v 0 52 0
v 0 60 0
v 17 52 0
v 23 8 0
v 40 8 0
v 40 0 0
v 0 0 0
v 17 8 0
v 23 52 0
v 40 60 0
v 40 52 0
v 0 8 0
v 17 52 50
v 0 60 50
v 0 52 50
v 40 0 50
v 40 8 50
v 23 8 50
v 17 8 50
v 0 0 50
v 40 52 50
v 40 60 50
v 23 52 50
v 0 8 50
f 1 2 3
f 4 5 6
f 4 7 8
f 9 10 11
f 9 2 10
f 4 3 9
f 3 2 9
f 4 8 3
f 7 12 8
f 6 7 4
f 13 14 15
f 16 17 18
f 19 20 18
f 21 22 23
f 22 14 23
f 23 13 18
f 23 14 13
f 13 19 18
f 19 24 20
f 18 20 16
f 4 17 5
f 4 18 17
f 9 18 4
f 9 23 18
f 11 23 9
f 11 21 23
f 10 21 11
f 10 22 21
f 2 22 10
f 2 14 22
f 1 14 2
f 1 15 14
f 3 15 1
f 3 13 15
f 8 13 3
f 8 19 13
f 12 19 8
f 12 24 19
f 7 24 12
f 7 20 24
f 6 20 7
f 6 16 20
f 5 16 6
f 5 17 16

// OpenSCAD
$fn = 32;

// ----------------------------------------------------------------------
// Structural section: ibeam 40 x 60 mm
// ----------------------------------------------------------------------

// --- parameters (mm) ---
sec_w = 40;               // section width, X
sec_h = 60;               // section height, Y
flange_t = 8;             // flange thickness
web_t = 6;                // web thickness
plate_t = 50;             // cut length, Z (extrusion height)

profile = [[0, 0], [40, 0], [40, 8], [23, 8], [23, 52], [40, 52], [40, 60], [0, 60], [0, 52], [17, 52], [17, 8], [0, 8]];  // primary outline, 12 points, counter clockwise

// --- the one profile operation ---
linear_extrude(height = plate_t) polygon(points = profile);
